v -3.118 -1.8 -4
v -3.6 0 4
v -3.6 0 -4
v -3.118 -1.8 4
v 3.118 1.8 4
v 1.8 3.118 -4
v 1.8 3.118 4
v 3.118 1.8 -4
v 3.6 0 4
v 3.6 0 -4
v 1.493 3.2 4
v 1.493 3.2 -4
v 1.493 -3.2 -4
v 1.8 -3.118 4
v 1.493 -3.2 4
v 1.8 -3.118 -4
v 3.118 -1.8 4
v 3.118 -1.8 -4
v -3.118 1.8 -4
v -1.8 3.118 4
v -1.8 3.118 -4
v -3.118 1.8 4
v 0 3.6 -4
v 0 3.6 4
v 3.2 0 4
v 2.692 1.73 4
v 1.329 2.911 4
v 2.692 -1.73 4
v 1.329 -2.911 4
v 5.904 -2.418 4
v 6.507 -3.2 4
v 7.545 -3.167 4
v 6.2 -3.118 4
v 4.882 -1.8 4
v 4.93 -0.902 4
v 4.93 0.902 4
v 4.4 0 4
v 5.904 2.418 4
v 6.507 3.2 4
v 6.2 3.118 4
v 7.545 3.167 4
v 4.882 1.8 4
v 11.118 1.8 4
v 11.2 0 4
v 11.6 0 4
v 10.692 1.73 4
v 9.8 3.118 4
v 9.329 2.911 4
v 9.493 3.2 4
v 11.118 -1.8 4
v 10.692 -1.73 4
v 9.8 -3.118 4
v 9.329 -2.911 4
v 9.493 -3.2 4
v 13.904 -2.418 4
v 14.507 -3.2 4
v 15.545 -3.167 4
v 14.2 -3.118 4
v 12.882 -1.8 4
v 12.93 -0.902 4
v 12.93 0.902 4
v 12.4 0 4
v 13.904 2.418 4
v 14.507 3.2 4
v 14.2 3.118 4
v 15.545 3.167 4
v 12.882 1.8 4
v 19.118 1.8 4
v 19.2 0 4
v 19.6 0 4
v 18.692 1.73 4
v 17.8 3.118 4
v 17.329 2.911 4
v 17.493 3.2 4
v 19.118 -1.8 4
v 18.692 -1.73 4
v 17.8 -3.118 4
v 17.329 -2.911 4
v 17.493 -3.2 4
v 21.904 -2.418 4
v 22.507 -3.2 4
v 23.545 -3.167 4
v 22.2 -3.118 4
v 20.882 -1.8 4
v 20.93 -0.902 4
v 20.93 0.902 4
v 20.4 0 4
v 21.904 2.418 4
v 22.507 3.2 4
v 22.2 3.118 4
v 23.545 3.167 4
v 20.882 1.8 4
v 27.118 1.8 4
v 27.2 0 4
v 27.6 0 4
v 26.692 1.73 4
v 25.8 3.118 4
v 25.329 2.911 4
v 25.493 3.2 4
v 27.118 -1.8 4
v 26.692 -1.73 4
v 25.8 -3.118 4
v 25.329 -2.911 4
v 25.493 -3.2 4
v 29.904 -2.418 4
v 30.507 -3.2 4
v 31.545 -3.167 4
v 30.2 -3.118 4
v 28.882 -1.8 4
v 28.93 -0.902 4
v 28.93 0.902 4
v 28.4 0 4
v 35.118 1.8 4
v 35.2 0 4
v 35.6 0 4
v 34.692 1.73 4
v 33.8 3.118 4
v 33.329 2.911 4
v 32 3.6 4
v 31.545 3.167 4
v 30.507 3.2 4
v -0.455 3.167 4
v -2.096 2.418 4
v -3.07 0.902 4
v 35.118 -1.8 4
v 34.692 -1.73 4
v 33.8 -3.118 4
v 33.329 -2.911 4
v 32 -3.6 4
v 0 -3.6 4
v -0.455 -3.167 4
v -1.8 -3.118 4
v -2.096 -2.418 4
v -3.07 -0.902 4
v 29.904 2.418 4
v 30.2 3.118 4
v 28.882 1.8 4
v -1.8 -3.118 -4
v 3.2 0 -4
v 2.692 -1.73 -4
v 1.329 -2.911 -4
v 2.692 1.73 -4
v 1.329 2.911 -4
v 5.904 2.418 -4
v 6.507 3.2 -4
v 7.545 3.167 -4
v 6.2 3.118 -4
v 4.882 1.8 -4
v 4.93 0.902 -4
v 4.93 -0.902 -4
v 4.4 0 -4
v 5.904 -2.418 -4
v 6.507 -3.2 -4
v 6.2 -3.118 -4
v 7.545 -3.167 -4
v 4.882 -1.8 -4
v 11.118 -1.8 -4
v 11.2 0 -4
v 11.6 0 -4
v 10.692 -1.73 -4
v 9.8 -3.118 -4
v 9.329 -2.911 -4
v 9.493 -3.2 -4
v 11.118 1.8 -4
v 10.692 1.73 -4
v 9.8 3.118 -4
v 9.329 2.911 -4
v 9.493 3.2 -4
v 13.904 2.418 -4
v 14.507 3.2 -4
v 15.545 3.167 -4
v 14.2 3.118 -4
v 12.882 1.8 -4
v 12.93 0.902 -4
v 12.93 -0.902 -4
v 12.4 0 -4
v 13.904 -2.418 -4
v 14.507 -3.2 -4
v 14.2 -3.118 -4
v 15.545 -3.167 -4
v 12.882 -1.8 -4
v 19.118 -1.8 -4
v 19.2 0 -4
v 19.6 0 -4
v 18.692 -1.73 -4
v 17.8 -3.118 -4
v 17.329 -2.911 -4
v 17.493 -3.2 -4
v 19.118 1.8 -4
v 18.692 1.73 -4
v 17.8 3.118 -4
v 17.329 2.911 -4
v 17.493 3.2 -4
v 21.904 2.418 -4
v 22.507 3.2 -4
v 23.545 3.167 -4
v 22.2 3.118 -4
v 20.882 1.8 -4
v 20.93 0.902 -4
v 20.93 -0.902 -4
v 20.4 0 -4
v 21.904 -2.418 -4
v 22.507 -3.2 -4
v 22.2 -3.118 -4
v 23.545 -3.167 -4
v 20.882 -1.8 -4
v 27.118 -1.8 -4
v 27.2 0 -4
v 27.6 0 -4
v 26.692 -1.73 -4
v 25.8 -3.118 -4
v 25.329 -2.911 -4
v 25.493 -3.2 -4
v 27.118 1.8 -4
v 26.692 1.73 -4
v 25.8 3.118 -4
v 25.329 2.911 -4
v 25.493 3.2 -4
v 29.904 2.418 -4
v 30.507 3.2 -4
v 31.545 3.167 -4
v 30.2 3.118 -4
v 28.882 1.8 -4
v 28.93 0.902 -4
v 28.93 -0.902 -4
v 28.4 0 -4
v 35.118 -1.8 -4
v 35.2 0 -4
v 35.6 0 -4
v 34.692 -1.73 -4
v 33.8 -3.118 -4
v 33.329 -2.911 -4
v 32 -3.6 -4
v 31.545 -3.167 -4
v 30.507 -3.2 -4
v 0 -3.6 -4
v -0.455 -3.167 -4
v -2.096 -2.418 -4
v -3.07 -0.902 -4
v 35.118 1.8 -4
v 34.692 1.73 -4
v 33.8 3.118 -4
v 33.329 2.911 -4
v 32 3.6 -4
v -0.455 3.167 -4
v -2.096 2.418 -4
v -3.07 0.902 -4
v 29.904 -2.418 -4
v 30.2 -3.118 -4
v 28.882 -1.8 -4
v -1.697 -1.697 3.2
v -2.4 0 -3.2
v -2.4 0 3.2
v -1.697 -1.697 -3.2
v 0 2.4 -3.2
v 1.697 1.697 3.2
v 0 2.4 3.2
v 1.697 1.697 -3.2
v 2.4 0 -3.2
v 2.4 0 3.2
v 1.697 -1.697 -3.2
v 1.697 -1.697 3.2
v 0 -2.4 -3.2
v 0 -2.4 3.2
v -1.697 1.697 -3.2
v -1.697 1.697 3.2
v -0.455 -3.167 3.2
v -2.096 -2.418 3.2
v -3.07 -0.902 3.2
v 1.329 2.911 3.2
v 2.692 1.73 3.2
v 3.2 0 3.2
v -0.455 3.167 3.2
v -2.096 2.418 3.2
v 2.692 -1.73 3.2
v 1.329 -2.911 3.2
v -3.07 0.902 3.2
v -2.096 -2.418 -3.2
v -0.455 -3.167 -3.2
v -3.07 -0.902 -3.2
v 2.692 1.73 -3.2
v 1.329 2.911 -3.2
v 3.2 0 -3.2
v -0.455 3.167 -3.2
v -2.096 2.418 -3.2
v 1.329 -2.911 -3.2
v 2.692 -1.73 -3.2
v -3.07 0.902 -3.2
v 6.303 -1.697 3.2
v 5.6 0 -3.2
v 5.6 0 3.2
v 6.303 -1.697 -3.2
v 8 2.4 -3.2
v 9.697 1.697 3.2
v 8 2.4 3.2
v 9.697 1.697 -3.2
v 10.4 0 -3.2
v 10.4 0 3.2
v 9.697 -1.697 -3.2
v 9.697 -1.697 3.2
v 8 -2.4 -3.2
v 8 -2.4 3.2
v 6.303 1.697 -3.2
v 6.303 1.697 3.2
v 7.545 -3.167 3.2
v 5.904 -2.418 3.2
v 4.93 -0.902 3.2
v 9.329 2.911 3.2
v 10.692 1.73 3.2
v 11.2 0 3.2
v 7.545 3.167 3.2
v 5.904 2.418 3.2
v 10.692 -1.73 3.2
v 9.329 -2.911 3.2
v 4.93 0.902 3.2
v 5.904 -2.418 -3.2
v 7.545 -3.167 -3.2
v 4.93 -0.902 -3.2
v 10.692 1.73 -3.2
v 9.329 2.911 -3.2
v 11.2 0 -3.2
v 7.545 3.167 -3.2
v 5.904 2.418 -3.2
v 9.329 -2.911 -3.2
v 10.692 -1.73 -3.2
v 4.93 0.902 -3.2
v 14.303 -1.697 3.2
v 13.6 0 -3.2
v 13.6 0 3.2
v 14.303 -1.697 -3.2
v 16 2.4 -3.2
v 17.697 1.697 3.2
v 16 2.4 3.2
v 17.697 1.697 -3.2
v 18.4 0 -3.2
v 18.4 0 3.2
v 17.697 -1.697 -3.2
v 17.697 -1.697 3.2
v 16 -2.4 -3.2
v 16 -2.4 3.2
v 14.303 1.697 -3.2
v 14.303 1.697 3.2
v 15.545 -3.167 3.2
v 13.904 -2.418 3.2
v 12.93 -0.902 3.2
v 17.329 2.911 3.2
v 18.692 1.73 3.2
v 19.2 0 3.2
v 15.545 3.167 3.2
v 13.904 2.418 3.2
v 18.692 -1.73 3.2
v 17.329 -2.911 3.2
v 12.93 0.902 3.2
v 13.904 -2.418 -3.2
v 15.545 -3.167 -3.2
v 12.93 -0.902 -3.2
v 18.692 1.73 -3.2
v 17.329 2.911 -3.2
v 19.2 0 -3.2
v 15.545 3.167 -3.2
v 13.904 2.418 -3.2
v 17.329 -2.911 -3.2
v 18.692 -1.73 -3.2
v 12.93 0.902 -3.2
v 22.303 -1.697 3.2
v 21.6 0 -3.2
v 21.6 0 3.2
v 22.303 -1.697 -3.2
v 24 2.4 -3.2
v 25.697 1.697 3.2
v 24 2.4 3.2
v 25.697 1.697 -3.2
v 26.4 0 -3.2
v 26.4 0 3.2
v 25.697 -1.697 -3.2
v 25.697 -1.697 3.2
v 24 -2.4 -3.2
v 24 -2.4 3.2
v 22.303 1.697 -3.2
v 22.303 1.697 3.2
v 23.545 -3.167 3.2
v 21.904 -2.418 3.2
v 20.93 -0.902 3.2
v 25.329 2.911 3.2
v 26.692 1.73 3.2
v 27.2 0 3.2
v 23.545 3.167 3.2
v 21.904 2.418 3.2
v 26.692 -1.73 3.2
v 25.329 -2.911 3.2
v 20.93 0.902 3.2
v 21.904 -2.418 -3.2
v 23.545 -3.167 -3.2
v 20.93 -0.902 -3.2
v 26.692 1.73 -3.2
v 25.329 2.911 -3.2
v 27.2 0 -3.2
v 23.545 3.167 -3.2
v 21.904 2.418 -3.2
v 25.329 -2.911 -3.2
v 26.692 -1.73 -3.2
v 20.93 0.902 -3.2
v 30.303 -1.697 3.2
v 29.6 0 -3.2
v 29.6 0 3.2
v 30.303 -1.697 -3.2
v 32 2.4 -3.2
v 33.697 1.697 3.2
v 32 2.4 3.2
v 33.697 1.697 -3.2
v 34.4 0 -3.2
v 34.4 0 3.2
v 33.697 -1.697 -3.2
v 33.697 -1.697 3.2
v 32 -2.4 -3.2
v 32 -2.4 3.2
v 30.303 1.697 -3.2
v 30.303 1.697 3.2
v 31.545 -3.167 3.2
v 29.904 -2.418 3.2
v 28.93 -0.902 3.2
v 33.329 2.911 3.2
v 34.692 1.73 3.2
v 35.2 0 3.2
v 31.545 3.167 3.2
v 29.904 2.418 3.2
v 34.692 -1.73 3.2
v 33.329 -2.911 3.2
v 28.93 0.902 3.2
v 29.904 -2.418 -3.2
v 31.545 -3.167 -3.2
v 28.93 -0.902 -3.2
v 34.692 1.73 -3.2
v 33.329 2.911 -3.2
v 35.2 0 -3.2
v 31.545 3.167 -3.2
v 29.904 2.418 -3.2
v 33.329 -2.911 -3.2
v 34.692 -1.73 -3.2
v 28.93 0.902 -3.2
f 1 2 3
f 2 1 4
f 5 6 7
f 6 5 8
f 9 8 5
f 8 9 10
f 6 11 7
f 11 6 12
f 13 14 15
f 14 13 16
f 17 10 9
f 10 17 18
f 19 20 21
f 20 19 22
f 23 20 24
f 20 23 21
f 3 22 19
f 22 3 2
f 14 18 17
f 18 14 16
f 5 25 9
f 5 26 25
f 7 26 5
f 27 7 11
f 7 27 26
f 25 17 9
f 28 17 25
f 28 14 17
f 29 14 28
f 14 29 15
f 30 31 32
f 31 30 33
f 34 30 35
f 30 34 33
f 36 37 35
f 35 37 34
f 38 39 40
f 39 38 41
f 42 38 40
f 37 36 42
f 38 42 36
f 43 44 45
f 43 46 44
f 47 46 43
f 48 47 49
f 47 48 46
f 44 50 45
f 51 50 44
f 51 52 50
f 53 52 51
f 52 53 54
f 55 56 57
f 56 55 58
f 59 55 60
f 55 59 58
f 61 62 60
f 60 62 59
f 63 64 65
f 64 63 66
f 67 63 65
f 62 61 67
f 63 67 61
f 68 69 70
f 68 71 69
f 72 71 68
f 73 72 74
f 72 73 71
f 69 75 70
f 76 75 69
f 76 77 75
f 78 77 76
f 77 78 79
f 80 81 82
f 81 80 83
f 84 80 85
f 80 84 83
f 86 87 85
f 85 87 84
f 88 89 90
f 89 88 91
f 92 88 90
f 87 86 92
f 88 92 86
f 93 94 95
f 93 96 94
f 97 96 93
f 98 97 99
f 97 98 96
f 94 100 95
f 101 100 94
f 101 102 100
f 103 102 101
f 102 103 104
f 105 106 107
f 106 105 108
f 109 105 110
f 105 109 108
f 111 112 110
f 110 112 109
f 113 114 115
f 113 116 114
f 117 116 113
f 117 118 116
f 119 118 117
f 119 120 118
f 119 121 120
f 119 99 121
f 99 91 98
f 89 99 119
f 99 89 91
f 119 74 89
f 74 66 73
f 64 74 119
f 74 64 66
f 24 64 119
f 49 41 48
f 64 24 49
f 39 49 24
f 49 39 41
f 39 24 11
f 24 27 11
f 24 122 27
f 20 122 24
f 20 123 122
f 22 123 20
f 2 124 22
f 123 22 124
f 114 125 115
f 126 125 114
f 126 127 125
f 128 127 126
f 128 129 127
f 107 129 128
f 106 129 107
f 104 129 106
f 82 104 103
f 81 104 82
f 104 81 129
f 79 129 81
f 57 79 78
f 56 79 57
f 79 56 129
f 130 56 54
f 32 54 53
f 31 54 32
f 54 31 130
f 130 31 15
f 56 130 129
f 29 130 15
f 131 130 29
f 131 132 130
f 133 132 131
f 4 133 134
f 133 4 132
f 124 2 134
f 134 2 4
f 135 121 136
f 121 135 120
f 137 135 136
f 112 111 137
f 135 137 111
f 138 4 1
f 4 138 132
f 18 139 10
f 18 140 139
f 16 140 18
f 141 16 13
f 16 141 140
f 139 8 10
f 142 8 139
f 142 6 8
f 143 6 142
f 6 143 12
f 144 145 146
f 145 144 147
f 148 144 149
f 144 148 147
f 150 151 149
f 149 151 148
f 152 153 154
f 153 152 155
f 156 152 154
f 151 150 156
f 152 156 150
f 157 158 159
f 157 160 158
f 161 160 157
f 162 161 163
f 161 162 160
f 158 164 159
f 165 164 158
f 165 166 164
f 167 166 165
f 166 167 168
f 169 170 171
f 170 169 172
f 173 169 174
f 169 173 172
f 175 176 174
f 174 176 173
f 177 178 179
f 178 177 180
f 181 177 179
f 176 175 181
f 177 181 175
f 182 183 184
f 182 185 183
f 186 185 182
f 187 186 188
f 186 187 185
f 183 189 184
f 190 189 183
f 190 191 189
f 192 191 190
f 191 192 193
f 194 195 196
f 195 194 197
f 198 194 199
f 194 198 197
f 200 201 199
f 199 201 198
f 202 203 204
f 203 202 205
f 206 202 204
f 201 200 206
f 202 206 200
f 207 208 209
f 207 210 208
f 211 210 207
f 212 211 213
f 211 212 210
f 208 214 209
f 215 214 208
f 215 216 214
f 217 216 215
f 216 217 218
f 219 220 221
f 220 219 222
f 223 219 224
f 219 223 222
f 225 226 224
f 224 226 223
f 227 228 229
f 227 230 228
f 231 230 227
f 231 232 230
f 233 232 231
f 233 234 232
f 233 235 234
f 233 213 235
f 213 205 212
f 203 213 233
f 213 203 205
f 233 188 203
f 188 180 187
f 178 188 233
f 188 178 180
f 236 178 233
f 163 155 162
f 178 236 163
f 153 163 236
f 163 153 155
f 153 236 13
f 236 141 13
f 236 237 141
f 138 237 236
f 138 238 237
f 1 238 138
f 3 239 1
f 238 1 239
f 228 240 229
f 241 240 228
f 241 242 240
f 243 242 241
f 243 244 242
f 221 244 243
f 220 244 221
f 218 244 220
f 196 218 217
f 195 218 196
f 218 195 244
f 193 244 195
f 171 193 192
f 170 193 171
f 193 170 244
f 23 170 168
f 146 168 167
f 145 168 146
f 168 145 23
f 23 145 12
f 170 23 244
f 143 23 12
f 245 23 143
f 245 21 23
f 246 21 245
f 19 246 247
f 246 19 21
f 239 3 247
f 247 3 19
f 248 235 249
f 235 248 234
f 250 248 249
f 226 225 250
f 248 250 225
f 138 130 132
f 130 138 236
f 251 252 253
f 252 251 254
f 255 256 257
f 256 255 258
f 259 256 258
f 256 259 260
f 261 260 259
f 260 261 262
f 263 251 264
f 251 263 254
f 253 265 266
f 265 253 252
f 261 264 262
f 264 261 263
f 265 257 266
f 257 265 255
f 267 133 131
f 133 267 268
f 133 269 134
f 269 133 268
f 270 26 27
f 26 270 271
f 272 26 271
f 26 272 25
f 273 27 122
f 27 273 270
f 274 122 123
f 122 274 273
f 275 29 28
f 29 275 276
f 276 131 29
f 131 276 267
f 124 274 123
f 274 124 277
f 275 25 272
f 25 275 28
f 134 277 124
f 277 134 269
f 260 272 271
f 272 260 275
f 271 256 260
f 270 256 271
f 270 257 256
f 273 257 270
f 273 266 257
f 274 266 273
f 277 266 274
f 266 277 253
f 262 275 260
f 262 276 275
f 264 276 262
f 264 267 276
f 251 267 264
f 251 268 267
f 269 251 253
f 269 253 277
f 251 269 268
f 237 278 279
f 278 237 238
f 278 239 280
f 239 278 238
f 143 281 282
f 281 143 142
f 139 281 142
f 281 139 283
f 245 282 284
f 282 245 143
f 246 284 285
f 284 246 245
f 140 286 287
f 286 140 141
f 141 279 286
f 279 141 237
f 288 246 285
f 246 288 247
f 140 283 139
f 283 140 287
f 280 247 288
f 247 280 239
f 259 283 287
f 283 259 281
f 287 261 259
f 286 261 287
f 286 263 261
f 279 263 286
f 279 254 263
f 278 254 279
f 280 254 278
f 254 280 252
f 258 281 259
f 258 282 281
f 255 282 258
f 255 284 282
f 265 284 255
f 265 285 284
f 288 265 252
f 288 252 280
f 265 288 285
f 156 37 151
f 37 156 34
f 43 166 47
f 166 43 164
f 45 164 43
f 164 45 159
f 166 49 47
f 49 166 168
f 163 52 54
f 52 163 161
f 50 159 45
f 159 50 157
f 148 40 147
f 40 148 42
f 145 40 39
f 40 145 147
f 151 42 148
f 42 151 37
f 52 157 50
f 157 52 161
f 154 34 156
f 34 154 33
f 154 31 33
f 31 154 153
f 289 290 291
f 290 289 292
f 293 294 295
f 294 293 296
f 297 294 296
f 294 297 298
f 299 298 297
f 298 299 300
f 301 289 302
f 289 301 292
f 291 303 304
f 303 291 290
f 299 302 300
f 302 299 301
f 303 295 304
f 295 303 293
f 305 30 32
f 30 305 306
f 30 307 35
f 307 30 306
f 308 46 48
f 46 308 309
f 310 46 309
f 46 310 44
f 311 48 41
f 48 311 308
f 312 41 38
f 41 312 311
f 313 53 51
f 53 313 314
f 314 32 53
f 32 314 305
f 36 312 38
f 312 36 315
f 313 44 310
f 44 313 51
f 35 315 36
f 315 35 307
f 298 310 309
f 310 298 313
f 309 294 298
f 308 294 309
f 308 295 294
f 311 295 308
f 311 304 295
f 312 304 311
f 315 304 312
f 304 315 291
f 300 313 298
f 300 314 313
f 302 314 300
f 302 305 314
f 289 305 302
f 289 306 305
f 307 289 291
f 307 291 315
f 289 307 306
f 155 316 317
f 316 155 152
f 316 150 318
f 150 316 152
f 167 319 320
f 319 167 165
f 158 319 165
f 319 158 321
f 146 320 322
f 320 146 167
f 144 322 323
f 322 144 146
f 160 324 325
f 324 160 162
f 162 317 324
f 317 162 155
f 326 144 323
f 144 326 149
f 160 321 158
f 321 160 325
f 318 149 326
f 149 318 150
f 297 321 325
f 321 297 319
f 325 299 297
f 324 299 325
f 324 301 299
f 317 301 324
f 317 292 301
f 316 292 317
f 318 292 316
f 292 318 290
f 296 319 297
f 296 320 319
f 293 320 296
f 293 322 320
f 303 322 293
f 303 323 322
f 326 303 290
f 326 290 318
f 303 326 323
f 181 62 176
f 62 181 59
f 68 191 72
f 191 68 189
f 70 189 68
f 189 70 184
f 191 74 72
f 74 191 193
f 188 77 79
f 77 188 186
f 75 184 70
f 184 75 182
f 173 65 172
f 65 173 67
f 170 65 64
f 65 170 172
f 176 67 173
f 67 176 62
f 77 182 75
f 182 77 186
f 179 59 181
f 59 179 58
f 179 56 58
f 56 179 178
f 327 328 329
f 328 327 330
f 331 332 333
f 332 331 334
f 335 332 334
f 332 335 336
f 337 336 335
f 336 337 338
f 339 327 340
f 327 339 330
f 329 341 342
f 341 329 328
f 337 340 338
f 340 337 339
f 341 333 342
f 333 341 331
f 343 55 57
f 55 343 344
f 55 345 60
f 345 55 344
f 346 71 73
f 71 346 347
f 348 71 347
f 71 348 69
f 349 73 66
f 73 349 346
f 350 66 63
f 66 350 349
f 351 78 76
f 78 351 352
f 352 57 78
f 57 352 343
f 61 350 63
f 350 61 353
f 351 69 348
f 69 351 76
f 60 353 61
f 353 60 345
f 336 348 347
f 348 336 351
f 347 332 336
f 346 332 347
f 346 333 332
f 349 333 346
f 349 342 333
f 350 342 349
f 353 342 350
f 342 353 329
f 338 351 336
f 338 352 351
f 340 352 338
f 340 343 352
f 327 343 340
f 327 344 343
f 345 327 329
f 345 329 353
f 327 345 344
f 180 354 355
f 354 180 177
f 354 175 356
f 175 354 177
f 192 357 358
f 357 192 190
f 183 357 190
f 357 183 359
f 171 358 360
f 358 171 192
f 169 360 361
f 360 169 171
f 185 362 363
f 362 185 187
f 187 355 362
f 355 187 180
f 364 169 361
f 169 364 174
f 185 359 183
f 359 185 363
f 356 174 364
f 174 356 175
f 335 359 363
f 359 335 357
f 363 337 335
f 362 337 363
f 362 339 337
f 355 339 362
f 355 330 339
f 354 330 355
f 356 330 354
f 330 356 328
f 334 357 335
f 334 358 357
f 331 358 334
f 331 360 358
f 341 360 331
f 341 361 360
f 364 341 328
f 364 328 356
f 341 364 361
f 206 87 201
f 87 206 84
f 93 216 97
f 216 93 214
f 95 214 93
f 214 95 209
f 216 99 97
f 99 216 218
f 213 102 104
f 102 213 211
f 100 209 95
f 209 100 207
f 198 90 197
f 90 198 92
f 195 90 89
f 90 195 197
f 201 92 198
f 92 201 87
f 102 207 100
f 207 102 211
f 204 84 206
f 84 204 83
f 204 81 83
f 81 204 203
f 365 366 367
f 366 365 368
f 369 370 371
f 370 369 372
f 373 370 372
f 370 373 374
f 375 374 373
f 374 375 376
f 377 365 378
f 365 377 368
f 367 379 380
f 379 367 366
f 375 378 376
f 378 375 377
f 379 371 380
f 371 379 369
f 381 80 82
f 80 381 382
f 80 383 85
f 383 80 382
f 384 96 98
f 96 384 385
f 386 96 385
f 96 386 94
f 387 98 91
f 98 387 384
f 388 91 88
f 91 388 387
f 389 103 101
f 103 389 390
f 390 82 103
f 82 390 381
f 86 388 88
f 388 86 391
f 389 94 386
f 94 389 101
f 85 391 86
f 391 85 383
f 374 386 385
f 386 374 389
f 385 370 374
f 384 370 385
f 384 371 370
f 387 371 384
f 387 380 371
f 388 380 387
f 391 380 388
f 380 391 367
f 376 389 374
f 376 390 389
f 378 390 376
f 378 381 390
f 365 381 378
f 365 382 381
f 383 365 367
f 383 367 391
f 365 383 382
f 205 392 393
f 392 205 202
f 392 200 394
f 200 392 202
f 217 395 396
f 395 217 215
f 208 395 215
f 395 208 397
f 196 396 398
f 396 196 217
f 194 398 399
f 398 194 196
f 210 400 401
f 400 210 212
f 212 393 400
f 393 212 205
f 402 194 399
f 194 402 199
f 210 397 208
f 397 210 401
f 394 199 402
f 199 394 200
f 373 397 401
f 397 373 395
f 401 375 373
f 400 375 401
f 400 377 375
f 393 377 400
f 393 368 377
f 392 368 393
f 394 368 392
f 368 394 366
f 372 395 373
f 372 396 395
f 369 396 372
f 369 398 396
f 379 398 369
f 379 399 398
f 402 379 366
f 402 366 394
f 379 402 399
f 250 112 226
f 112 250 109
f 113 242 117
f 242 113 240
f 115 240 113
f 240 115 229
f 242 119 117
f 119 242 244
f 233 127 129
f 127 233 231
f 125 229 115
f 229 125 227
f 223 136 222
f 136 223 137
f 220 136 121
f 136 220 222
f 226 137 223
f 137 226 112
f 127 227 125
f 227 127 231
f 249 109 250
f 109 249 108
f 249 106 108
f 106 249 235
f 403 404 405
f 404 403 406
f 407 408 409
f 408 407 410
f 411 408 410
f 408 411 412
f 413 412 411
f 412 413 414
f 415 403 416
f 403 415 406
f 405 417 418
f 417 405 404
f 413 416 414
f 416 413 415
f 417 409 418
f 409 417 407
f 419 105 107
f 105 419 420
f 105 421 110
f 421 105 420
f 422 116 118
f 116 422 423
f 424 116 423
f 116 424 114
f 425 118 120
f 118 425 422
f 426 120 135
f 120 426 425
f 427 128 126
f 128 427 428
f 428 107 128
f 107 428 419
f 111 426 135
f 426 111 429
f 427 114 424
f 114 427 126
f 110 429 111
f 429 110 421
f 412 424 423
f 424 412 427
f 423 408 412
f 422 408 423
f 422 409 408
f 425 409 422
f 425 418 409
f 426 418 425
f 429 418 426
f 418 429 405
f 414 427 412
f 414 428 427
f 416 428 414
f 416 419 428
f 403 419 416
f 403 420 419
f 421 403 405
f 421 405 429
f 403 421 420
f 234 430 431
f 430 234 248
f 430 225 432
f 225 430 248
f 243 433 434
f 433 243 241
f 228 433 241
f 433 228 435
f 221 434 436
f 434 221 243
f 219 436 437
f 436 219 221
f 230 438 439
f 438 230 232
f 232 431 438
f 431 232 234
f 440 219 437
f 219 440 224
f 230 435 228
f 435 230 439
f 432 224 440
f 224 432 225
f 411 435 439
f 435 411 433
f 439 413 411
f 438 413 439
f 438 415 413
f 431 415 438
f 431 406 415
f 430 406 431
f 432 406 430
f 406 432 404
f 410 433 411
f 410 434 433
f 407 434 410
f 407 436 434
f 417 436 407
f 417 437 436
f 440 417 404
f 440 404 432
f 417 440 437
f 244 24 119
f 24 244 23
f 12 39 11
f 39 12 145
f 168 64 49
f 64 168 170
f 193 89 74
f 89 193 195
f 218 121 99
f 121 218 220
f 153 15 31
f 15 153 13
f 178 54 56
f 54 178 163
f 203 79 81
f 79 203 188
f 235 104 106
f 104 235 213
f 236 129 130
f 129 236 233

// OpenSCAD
// file: ../primitives/tube.scad
module tube(h, dint, dext, center = false) {
    difference() {
        cylinder(h = h, d = dext, center = center);
        cylinder(h = h + 0.1, d = dint, center = center);
    }
}
// main file
include <../primitives/tube.scad>

module beam(
    h = 8, dint = 4.8, dMid = 6.4, dext = 7.2, pitch = 0.8, holes = [1, 1],
    crossThickness = 2.4, zMid = 0.8
) {
    module hole() {
        module innerHole(up) {
            z = up ? h/2 - zMid/2 : -h/2 + zMid/2;

            translate([0, 0, z]) {
                cylinder(h = zMid, d = dMid, center = true);
            }
        }

        difference() {
            tube(h, dint, dext, center = true);
            innerHole(up = true);
            innerHole(up = false);
        }
    }

    module holeCross() {
        module crossPart() {
            cube([dMid, crossThickness, h], center = true);
        }

        difference() {
            cylinder(d = dext, h = h, center = true);
            crossPart();
            rotate([0, 0, 90]) crossPart();
        }
    }

    module holeCylinder() {
        cylinder(d = dext, h = h, center = true);
    }

    module selectHole(type) {
        if (type == 1) {
            hole();
        }
        else if (type == 2) {
            holeCross();
        }
        else if (type == 3) {
            holeCylinder();
        }
    }

    module plate(up) {
        size = [
            (len(holes) - 1) * (pitch + dext),
            dext/2 - dMid/2,
            h
        ];

        pos = [
            0,
            up ? dMid/2 : -size.y - dMid/2,
            -size.z/2
        ];

        translate(pos) cube(size);
    }

    union() {
        delta = dext + pitch;
        for (i = [0 : len(holes) - 1]) {
            translate([i * delta, 0, 0]) {
                selectHole(holes[i]);
            }
        }

        plate(up = true);
        plate(up = false);
    }
}

module invertedBeam(
    h = 8, dint = 4.8, dMid = 6.4, dext = 7.2, pitch = 0.8, holes = [1, 1],
    crossThickness = 2.4, zMid = 0.8
) {
    module hole() {
        module innerHole(up) {
            z = up ? h/2 - zMid/2 : -h/2 + zMid/2;

            translate([0, 0, z]) {
                cylinder(h = zMid, d = dMid, center = true);
            }
        }

        union() {
            cylinder(h = h, d = dint, center = true);
            innerHole(up = true);
            innerHole(up = false);
        }
    }

    module holeCross() {
        module crossPart() {
            cube([dMid, crossThickness, h], center = true);
        }

        union() {
            crossPart();
            rotate([0, 0, 90]) crossPart();
        }
    }

    module selectHole(type) {
        if (type == 1) {
            hole();
        }
        else if (type == 2) {
            holeCross();
        }
    }

    union() {
        delta = dext + pitch;
        for (i = [0 : len(holes) - 1]) {
            translate([i * delta, 0, 0]) {
                selectHole(holes[i]);
            }
        }
    }
}

beam(holes = [1, 1, 1, 1, 1]);
